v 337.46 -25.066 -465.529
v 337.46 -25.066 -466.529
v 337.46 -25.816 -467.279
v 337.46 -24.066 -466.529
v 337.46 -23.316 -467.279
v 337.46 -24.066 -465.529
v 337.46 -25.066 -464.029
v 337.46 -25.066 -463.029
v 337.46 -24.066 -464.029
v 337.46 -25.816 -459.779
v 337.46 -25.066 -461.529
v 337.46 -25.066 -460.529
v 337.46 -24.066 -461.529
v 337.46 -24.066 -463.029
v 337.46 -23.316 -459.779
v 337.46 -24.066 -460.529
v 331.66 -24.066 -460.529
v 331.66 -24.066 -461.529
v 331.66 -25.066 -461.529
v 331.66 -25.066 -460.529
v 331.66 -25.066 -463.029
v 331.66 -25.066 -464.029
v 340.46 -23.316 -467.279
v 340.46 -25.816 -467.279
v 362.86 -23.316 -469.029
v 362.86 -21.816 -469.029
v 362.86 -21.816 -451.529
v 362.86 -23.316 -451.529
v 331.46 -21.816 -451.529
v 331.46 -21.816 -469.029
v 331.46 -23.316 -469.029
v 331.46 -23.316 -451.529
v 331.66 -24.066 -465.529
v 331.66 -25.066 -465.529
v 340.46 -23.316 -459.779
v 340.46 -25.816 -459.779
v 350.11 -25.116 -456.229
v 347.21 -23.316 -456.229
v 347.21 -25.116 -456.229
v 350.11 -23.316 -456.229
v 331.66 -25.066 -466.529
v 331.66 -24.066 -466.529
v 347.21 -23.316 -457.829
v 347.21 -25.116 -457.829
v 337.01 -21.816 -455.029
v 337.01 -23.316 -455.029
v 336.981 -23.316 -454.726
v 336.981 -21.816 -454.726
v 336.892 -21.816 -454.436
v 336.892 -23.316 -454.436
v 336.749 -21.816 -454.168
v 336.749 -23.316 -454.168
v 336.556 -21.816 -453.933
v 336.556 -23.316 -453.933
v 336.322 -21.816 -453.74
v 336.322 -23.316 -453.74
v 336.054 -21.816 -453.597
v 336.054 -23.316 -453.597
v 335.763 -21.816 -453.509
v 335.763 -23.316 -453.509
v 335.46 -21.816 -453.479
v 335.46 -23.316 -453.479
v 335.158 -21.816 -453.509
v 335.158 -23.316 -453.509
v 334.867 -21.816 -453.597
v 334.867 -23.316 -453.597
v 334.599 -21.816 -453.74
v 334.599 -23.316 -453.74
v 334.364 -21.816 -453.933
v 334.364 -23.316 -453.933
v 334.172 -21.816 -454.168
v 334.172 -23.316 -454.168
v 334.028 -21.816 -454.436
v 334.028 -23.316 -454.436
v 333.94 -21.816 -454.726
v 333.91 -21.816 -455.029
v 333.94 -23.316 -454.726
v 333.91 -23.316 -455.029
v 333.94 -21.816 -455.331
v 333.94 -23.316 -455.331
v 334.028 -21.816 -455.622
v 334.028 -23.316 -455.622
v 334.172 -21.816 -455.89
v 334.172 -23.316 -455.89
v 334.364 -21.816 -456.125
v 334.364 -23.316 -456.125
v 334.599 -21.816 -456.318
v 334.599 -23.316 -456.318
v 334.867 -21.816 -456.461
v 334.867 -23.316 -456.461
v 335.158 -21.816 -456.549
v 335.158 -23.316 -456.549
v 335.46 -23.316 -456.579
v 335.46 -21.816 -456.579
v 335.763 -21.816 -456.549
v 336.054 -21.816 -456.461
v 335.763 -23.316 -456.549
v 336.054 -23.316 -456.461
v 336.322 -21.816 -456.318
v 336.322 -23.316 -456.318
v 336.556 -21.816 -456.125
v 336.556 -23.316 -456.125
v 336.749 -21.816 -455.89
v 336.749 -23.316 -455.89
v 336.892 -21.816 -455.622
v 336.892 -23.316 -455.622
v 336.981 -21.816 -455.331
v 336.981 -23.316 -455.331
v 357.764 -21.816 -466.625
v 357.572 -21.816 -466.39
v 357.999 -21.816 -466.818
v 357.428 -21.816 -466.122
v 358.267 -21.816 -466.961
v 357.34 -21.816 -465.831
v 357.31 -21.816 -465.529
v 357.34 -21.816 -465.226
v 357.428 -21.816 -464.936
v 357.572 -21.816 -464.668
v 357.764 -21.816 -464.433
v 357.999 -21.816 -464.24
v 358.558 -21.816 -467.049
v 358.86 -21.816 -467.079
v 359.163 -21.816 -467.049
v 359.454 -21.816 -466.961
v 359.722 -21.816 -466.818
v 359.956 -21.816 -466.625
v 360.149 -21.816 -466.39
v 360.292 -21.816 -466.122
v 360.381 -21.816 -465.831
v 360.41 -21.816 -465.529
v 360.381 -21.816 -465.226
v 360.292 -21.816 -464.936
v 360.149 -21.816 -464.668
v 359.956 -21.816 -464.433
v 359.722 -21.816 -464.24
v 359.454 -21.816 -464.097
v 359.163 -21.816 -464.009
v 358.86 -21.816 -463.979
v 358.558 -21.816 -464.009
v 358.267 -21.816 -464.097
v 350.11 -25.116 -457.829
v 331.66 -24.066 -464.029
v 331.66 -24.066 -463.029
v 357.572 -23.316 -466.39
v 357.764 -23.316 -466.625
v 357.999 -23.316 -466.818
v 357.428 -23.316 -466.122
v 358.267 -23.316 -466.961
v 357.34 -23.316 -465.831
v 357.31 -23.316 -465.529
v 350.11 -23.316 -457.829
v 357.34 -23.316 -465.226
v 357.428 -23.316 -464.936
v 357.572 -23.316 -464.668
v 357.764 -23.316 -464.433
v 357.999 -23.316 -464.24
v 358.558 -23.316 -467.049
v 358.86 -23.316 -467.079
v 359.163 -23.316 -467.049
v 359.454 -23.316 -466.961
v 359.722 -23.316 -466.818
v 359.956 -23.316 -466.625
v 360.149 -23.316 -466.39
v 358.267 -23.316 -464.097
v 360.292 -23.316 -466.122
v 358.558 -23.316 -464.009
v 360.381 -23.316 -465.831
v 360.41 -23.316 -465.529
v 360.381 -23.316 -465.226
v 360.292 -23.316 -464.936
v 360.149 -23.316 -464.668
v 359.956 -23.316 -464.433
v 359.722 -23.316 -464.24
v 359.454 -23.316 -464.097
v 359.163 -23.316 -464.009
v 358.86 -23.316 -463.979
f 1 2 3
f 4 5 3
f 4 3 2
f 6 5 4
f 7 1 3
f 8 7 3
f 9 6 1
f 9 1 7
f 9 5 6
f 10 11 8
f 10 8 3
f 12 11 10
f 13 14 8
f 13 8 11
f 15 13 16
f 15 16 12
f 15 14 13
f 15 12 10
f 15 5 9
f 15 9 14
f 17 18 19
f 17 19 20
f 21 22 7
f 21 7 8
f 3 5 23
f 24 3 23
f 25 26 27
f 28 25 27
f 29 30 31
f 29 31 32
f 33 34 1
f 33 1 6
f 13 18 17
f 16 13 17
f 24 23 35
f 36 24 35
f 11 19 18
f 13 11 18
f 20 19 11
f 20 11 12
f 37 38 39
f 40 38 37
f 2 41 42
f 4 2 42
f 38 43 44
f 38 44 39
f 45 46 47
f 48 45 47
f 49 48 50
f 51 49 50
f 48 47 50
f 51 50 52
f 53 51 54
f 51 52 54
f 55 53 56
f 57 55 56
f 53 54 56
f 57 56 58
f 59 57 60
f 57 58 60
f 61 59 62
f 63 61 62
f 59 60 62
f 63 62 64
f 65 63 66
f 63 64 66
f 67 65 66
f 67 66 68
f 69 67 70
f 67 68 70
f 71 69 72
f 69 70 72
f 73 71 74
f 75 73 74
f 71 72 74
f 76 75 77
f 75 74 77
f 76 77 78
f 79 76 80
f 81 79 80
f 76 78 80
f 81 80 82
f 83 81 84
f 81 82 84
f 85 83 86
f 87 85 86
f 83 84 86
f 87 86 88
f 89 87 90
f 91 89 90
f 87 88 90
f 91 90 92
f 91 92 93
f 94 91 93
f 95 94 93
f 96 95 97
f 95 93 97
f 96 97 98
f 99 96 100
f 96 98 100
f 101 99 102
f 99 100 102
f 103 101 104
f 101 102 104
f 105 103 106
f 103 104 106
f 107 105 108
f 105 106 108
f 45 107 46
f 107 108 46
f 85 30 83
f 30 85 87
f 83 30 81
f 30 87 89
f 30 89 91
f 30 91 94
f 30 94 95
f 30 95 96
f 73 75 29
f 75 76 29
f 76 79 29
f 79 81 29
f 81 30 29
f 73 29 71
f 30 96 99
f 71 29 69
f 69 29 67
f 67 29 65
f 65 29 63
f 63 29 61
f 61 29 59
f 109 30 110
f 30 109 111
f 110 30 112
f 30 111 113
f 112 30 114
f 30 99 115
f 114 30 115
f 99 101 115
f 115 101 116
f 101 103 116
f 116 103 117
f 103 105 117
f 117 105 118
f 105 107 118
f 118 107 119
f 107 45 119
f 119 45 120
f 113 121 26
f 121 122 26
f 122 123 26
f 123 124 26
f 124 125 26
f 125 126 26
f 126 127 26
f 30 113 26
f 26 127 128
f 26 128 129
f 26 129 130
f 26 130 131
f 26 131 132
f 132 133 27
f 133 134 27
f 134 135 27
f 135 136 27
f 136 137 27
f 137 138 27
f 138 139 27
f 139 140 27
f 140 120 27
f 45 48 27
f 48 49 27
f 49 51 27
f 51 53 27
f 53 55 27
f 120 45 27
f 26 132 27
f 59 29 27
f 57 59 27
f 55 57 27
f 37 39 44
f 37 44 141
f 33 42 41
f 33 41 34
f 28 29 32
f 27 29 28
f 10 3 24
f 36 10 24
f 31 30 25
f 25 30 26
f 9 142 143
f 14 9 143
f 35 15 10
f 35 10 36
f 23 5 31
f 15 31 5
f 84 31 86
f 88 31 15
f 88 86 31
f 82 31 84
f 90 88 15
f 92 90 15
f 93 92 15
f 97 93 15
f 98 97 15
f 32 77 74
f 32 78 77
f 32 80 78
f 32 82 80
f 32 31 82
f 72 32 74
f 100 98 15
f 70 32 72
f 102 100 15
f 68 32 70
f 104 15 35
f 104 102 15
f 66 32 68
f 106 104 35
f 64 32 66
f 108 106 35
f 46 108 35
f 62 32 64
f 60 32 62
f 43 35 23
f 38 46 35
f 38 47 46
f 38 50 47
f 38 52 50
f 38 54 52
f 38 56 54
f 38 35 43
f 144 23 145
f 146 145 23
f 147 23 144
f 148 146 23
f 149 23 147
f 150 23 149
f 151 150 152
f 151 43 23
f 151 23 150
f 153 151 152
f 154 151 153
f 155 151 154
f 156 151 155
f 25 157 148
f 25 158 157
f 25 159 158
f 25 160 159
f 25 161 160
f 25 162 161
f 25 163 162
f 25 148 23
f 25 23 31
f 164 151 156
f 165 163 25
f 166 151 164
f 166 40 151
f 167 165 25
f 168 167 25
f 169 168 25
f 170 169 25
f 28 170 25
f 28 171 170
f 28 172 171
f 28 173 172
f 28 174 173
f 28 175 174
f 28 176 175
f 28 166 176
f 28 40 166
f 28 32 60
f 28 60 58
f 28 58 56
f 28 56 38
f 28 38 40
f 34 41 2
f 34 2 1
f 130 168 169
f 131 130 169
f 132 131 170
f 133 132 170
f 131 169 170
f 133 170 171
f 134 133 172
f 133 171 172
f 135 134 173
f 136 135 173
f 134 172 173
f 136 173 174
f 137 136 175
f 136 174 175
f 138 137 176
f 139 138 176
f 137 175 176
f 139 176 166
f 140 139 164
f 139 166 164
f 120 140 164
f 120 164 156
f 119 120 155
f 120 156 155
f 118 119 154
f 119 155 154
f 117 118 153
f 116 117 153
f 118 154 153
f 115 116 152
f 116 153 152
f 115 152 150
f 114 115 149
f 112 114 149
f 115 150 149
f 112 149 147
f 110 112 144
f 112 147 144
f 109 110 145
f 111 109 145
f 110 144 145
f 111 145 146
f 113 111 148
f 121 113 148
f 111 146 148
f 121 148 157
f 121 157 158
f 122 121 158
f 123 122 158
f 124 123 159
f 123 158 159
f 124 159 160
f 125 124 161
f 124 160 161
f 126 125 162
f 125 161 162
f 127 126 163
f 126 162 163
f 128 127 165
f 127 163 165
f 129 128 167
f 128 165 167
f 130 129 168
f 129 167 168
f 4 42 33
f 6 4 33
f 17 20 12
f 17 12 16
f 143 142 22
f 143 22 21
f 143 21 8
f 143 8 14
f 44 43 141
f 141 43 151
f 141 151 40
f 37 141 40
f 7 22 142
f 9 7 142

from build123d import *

# Parameters (mm, degrees)
SZKIC1_W                    = 31.4
SZKIC1_H                    = 17.5
DODANIE_WYCI_GNI_CIE1_DEPTH = 1.5
SZKIC2_R                    = 1.55
WYTNIJ_WYCI_GNI_CIE1_DEPTH  = 1.5
SZKIC3_W                    = 2.9
SZKIC3_H                    = 1.6
DODANIE_WYCI_GNI_CIE2_DEPTH = 1.8
SZKIC4_W                    = 3
SZKIC4_H                    = 7.5
DODANIE_WYCI_GNI_CIE3_DEPTH = 2.5
SZKIC6_W                    = 1
SZKIC6_H                    = 1
DODANIE_WYCI_GNI_CIE5_DEPTH = 5.8
SZYK_LINIOWY3_COUNT         = 3
SZYK_LINIOWY3_PITCH         = 2.5


with BuildPart() as part:
    # Szkic1 → Dodanie-wyciągnięcie1 (new body)
    with BuildSketch(Plane.XZ.offset(21.816434763)):
        with Locations((347.160462116, -460.278787137)):
            Rectangle(SZKIC1_W, SZKIC1_H)
    extrude(amount=DODANIE_WYCI_GNI_CIE1_DEPTH)

    # Szkic2 → Wytnij-wyciągnięcie1 (cut)
    with BuildSketch(Plane.XZ.offset(23.316434763)):
        with Locations((358.860462116, -465.528787137)):
            Circle(SZKIC2_R)
        with Locations((335.460462116, -455.028787137)):
            Circle(SZKIC2_R)
    extrude(amount=-WYTNIJ_WYCI_GNI_CIE1_DEPTH, mode=Mode.SUBTRACT)

    # Szkic3 → Dodanie-wyciągnięcie2 (add)
    with BuildSketch(Plane.XZ.offset(23.316434763)):
        with Locations((348.660462116, -457.028787137)):
            Rectangle(SZKIC3_W, SZKIC3_H)
    extrude(amount=DODANIE_WYCI_GNI_CIE2_DEPTH)

    # Szkic4 → Dodanie-wyciągnięcie3 (add)
    with BuildSketch(Plane.XZ.offset(23.316434763)):
        with Locations((338.960462116, -463.528787137)):
            Rectangle(SZKIC4_W, SZKIC4_H)
    extrude(amount=DODANIE_WYCI_GNI_CIE3_DEPTH)

    # Szkic6 → Dodanie-wyciągnięcie5 (add)
    with BuildSketch(Plane.ZY.offset(-337.460462116)):
        with Locations((-461.028787137, -24.566434763)):
            Rectangle(SZKIC6_W, SZKIC6_H)
    dodanie_wyci_gni_cie5 = extrude(amount=DODANIE_WYCI_GNI_CIE5_DEPTH)

    # Szyk liniowy3: Dodanie-wyciągnięcie5 ×3
    with Locations(*[(0, 0, -i * SZYK_LINIOWY3_PITCH) for i in range(1, SZYK_LINIOWY3_COUNT)]):
        add(dodanie_wyci_gni_cie5)


solid = part.part
